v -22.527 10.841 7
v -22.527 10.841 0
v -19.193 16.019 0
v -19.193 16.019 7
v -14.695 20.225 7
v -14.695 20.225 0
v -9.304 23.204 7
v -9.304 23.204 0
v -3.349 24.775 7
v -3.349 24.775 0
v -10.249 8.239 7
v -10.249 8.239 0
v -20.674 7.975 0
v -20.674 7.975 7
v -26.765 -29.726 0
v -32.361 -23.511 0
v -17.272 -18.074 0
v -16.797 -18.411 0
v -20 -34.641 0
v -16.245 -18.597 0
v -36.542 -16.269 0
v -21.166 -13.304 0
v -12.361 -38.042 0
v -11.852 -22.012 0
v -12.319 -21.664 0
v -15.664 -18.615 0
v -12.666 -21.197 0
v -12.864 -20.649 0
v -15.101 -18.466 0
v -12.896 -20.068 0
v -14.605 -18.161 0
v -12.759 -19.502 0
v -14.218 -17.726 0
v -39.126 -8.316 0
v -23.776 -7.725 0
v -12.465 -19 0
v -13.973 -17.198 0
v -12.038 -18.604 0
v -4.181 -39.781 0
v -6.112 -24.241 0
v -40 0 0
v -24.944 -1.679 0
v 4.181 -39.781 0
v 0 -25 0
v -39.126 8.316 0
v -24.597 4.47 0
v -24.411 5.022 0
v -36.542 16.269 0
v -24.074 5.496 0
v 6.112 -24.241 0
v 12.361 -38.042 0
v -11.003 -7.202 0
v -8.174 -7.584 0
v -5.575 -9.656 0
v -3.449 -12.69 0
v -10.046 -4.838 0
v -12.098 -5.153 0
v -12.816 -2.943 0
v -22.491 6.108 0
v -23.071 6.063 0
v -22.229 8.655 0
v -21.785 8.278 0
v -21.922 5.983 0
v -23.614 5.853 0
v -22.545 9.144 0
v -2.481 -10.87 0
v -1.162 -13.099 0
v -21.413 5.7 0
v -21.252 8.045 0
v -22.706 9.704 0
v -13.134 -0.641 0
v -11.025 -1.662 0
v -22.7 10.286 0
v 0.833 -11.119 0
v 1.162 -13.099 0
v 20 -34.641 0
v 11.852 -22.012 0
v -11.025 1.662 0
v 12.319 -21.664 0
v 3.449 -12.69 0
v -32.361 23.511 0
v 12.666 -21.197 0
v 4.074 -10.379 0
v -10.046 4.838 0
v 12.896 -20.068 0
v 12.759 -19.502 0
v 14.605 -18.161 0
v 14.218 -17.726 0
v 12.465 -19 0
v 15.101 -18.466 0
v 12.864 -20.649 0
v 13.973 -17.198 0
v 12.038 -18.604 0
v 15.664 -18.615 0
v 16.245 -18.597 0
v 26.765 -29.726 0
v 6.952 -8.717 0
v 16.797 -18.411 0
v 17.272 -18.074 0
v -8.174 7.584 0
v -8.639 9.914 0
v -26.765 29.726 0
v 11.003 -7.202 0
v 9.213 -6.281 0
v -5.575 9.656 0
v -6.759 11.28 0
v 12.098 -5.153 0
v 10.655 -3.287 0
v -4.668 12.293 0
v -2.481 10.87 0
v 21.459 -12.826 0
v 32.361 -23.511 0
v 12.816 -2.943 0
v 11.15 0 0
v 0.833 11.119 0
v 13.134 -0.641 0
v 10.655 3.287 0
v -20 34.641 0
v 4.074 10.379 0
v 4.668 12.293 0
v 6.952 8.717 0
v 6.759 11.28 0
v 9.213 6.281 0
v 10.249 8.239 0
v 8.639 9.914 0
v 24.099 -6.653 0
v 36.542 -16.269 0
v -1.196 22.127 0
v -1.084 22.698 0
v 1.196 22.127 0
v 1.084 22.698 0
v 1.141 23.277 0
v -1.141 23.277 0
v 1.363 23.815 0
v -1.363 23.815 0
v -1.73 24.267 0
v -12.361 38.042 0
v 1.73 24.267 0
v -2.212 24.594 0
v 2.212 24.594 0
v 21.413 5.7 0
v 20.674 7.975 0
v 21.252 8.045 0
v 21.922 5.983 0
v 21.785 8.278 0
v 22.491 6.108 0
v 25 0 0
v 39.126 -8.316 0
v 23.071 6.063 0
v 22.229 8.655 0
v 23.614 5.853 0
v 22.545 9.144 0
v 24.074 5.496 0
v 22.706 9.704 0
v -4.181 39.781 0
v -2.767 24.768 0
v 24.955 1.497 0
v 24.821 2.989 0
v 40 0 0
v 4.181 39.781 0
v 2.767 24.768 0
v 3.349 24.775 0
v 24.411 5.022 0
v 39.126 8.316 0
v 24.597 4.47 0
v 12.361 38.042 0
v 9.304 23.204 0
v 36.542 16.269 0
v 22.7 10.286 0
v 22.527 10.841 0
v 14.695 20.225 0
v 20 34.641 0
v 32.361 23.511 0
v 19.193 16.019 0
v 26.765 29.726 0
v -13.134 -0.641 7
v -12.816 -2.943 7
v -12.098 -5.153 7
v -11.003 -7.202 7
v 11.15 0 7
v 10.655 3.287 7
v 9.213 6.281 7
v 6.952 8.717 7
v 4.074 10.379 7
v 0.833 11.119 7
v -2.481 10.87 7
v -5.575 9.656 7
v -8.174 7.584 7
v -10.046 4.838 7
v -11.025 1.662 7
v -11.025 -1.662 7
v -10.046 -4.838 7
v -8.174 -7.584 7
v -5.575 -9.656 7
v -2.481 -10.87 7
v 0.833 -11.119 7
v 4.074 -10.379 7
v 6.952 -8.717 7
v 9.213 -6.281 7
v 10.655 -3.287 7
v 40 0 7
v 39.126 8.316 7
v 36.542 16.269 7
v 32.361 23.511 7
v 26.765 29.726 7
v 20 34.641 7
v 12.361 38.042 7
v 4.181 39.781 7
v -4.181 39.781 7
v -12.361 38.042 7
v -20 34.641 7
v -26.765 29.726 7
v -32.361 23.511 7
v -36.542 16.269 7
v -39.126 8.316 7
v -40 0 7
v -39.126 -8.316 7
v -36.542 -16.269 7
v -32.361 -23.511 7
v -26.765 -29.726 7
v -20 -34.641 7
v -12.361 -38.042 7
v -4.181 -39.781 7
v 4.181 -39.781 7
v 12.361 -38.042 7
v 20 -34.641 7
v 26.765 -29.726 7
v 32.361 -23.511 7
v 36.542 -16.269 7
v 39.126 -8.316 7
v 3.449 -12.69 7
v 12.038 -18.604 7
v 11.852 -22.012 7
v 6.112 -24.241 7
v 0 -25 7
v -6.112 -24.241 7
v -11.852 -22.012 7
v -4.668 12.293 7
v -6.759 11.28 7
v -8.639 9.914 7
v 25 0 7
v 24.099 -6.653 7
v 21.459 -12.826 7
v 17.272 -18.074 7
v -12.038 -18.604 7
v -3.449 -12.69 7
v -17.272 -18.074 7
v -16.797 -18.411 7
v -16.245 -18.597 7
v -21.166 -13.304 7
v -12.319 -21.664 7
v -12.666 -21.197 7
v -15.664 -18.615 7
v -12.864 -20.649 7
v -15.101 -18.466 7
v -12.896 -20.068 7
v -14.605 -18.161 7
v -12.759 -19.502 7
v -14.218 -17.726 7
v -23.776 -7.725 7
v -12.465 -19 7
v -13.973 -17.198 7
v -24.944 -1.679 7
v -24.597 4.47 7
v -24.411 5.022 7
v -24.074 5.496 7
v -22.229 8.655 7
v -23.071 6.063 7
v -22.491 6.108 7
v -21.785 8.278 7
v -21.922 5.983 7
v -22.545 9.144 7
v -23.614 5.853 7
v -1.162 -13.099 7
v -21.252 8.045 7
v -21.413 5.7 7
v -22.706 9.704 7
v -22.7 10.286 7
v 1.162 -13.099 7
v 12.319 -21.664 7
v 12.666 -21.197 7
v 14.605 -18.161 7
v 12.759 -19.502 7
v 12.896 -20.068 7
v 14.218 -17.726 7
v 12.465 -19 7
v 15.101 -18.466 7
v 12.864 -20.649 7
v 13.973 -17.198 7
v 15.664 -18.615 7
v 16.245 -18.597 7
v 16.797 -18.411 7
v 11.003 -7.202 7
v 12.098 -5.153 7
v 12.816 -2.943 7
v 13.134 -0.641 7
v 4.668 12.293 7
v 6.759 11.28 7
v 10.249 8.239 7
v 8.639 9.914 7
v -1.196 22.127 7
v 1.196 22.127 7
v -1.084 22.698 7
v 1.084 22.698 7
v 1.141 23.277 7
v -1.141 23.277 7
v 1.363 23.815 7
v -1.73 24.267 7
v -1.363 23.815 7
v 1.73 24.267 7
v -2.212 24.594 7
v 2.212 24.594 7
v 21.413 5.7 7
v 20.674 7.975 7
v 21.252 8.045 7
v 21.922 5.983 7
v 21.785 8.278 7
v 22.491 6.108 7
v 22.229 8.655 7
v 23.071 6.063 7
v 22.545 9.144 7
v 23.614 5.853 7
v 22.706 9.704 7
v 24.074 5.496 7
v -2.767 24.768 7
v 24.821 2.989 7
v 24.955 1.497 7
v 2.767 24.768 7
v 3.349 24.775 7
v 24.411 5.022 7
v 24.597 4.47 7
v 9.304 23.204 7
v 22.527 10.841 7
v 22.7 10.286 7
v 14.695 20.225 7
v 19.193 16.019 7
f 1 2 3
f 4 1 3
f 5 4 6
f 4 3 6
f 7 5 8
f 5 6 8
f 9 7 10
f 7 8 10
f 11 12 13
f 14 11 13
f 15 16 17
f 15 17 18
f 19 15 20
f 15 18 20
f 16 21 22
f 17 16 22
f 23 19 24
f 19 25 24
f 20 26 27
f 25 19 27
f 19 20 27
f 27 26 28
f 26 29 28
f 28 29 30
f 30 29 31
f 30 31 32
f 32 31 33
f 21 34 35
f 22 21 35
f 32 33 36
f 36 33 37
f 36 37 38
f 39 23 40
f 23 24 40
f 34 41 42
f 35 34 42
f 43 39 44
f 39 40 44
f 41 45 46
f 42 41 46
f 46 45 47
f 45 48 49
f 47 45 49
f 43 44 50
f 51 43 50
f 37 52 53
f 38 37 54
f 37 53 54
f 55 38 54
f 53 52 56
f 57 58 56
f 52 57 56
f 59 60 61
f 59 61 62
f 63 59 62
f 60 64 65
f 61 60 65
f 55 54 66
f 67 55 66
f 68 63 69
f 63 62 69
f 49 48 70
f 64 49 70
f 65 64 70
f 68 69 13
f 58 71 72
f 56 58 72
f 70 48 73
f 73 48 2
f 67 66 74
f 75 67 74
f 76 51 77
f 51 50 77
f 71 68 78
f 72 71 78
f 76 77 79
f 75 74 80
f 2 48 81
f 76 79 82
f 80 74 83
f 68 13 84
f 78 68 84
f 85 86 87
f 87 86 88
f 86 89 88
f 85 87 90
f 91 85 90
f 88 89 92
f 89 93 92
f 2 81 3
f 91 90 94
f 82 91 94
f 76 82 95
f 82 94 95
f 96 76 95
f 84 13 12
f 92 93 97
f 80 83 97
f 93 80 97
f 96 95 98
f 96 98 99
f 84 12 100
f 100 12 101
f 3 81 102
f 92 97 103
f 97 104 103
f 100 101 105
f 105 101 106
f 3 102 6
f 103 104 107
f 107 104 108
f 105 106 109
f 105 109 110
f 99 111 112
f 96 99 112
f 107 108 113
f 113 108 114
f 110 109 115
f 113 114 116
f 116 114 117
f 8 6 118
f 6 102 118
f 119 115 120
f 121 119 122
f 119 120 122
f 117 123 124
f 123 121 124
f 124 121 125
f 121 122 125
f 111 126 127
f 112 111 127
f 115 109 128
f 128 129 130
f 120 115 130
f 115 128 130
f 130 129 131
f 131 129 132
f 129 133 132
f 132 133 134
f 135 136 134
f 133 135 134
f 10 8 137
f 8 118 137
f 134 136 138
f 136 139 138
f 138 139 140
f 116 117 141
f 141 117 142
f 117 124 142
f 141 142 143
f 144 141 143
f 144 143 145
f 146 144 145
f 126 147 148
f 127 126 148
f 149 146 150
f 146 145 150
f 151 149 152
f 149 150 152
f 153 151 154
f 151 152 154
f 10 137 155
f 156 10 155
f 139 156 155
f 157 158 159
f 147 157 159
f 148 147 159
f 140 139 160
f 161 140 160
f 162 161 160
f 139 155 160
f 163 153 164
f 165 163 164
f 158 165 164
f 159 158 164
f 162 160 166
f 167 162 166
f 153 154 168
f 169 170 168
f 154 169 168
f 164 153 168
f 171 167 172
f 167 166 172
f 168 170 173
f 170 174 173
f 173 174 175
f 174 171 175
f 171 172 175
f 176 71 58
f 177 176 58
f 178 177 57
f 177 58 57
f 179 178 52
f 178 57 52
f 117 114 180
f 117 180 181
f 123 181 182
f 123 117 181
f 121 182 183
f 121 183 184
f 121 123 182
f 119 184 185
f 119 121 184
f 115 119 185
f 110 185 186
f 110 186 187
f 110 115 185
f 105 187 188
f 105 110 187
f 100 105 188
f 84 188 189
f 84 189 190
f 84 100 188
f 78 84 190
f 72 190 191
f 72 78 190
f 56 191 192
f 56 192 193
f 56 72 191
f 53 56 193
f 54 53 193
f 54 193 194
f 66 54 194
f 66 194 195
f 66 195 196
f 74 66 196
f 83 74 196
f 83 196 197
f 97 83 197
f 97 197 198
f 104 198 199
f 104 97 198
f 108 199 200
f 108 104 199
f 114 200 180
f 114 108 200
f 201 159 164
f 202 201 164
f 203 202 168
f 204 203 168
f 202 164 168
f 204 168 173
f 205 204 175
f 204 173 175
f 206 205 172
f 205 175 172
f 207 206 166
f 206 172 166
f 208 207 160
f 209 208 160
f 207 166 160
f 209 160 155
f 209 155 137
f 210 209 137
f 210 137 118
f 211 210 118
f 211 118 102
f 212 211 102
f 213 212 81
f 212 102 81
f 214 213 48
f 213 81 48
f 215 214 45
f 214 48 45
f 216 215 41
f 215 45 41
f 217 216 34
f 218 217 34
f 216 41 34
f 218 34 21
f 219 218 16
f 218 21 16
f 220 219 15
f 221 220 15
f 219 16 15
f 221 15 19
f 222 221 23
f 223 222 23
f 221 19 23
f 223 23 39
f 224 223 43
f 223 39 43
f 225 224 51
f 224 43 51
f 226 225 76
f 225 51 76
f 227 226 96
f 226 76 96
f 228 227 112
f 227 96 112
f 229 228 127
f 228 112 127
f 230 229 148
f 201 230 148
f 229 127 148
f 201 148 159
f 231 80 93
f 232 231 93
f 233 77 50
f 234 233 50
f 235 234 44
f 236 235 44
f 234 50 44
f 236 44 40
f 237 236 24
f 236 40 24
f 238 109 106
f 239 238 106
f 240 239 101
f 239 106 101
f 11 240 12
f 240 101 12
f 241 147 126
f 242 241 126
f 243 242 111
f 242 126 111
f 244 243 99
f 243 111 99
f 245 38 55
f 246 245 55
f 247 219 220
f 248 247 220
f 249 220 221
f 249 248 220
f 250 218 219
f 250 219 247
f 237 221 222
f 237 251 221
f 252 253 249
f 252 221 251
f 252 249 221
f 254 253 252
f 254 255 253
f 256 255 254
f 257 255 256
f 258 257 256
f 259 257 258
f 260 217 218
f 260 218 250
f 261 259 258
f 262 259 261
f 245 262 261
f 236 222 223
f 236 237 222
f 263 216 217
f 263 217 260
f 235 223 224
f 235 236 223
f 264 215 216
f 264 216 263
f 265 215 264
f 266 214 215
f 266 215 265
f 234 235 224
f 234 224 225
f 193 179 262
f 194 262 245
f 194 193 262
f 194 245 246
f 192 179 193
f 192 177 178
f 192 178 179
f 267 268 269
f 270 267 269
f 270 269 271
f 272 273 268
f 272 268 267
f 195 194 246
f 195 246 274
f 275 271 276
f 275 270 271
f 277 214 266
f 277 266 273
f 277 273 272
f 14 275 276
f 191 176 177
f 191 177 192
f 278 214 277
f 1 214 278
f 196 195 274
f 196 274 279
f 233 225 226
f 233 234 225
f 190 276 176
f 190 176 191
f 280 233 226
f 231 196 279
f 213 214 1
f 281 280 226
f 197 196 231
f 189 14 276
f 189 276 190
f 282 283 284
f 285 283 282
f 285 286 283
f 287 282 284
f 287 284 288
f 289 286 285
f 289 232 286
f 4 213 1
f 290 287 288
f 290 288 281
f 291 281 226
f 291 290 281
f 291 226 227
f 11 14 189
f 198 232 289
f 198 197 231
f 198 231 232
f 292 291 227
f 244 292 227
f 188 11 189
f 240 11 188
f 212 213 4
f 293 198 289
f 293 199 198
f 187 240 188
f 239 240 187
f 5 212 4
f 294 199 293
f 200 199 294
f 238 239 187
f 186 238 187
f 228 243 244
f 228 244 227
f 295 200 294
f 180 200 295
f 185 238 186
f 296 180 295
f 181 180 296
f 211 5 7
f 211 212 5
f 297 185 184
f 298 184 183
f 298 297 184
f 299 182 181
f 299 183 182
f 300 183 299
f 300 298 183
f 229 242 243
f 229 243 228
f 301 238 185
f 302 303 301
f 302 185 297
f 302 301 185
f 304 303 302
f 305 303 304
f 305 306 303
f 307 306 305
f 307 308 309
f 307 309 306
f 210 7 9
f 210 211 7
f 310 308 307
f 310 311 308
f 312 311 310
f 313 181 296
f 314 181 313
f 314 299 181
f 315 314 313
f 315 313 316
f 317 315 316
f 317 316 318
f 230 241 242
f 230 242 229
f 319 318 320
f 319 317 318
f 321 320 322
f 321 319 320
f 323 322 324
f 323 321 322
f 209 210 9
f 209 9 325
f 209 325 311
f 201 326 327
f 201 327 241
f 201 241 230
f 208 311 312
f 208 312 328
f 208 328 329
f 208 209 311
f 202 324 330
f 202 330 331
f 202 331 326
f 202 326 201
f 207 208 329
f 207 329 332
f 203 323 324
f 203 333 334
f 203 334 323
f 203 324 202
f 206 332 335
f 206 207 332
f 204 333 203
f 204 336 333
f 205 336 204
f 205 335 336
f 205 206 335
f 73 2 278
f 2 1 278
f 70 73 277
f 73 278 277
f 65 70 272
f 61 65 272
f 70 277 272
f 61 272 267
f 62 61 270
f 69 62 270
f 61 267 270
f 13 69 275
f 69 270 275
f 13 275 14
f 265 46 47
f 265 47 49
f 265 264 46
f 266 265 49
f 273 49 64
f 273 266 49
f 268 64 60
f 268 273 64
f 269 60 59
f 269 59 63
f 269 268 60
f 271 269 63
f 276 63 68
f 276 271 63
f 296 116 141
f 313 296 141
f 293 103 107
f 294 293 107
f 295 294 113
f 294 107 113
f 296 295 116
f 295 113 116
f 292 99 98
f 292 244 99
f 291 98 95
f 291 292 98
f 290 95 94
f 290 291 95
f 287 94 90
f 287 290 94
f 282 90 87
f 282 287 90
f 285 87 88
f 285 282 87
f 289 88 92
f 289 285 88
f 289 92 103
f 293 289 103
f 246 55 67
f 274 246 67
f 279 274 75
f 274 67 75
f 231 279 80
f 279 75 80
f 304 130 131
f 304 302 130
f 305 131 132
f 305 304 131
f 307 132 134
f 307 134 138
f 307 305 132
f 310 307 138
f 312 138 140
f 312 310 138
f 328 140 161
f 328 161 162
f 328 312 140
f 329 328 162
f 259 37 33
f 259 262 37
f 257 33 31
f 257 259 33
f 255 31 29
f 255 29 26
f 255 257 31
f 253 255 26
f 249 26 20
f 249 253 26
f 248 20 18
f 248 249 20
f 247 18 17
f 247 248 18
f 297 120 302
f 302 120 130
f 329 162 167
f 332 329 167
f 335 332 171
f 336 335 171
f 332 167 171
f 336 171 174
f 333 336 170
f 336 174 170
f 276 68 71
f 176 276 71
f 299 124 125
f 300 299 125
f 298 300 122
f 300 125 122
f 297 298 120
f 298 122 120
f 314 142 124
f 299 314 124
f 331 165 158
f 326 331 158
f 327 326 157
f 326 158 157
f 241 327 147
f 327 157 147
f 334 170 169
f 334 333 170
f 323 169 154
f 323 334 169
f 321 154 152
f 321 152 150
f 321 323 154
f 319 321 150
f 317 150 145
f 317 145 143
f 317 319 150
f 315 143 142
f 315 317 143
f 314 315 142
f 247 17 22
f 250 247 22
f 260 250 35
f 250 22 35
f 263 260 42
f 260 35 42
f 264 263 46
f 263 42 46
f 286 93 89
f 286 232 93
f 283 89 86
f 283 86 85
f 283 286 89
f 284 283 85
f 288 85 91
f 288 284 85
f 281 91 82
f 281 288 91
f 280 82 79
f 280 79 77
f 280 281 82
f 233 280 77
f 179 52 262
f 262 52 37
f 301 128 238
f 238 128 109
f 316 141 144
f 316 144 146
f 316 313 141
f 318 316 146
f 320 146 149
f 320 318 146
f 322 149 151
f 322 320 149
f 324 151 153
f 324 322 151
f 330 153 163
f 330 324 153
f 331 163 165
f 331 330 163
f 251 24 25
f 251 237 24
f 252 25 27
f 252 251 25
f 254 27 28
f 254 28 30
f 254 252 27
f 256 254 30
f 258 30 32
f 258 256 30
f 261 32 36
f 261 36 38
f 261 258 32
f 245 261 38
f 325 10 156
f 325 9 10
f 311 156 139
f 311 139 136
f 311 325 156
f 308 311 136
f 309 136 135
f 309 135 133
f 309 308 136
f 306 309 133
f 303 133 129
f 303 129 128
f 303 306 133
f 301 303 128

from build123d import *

# Parameters (mm, degrees)
F0_R     = 40
F0_R_2   = 35
F0_R_3   = 30
F0_R_4   = 11.15
F1_DEPTH = 7
F2_R     = 2


with BuildPart() as f1:
    # F0 (on Top) → F1 (new body)
    with BuildSketch(Plane.XY):
        Circle(F0_R)
        Circle(F0_R_2, mode=Mode.SUBTRACT)
        Circle(F0_R_2)
        Circle(F0_R_3, mode=Mode.SUBTRACT)
        Circle(F0_R_3)
        with BuildLine():
            ThreePointArc((0.1811274542, 24.9993438483), (14.6946313073, 20.2254248594), (23.7198174085, 7.8974845429))
            Line((23.7198174085, 7.8974845429), (24.2635492258, 7.883705044))
            Line((24.2635492258, 7.883705044), (23.8317603315, 7.5529596518))
            ThreePointArc((23.8317603315, 7.5529596518), (24.7062138772, 3.8213866405), (25, 0))
            ThreePointArc((25, 0), (22.3161322869, -11.2689946204), (14.8407808196, -20.1184299752))
            Line((14.8407808196, -20.1184299752), (14.9956981092, -20.6398077624))
            Line((14.9956981092, -20.6398077624), (14.5477104425, -20.3313580678))
            ThreePointArc((14.5477104425, -20.3313580678), (0, -25), (-14.5477104425, -20.3313580678))
            Line((-14.5477104425, -20.3313580678), (-14.9956981092, -20.6398077624))
            Line((-14.9956981092, -20.6398077624), (-14.8407808196, -20.1184299752))
            ThreePointArc((-14.8407808196, -20.1184299752), (-23.7764129074, -7.7254248594), (-23.8317603315, 7.5529596518))
            Line((-23.8317603315, 7.5529596518), (-24.2635492258, 7.883705044))
            Line((-24.2635492258, 7.883705044), (-23.7198174085, 7.8974845429))
            ThreePointArc((-23.7198174085, 7.8974845429), (-14.6946313073, 20.2254248594), (-0.1811274542, 24.9993438483))
            Line((-0.1811274542, 24.9993438483), (0, 25.5122054368))
            Line((0, 25.5122054368), (0.1811274542, 24.9993438483))
        make_face(mode=Mode.SUBTRACT)
        with BuildLine():
            Line((13.1343616929, -0.6411262894), (10.2490772421, 8.2388661651))
            ThreePointArc((10.2490772421, 8.2388661651), (7.7293760676, 10.638573476), (4.6684883087, 12.2934013565))
            Line((4.6684883087, 12.2934013565), (-4.6684883087, 12.2934013565))
            ThreePointArc((-4.6684883087, 12.2934013565), (-7.7293760676, 10.638573476), (-10.2490772421, 8.2388661651))
            Line((-10.2490772421, 8.2388661651), (-13.1343616929, -0.6411262894))
            ThreePointArc((-13.1343616929, -0.6411262894), (-12.5063931893, -4.063573476), (-11.0027663976, -7.2015020377))
            Line((-11.0027663976, -7.2015020377), (-3.4489936381, -12.6896391944))
            ThreePointArc((-3.4489936381, -12.6896391944), (0, -13.15), (3.4489936381, -12.6896391944))
            Line((3.4489936381, -12.6896391944), (11.0027663976, -7.2015020377))
            ThreePointArc((11.0027663976, -7.2015020377), (12.5063931893, -4.063573476), (13.1343616929, -0.6411262894))
        make_face()
        Circle(F0_R_4, mode=Mode.SUBTRACT)
        with BuildLine():
            ThreePointArc((-4.6684883087, 12.2934013565), (0, 13.15), (4.6684883087, 12.2934013565))
            Line((4.6684883087, 12.2934013565), (0.1811274542, 24.9993438483))
            ThreePointArc((0.1811274542, 24.9993438483), (0, 25), (-0.1811274542, 24.9993438483))
            Line((-0.1811274542, 24.9993438483), (-4.6684883087, 12.2934013565))
        make_face()
        with BuildLine():
            ThreePointArc((-13.1343616929, -0.6411262894), (-12.5063931893, 4.063573476), (-10.2490772421, 8.2388661651))
            Line((-10.2490772421, 8.2388661651), (-23.7198174085, 7.8974845429))
            ThreePointArc((-23.7198174085, 7.8974845429), (-23.7764129074, 7.7254248594), (-23.8317603315, 7.5529596518))
            Line((-23.8317603315, 7.5529596518), (-13.1343616929, -0.6411262894))
        make_face()
        with BuildLine():
            Line((-14.5477104425, -20.3313580678), (-3.4489936381, -12.6896391944))
            ThreePointArc((-3.4489936381, -12.6896391944), (-7.7293760676, -10.638573476), (-11.0027663976, -7.2015020377))
            Line((-11.0027663976, -7.2015020377), (-14.8407808196, -20.1184299752))
            ThreePointArc((-14.8407808196, -20.1184299752), (-14.6946313073, -20.2254248594), (-14.5477104425, -20.3313580678))
        make_face()
        with BuildLine():
            Line((14.8407808196, -20.1184299752), (11.0027663976, -7.2015020377))
            ThreePointArc((11.0027663976, -7.2015020377), (7.7293760676, -10.638573476), (3.4489936381, -12.6896391944))
            Line((3.4489936381, -12.6896391944), (14.5477104425, -20.3313580678))
            ThreePointArc((14.5477104425, -20.3313580678), (14.6946313073, -20.2254248594), (14.8407808196, -20.1184299752))
        make_face()
        with BuildLine():
            ThreePointArc((10.2490772421, 8.2388661651), (12.4035854843, 4.3673295197), (13.15, 0))
            ThreePointArc((13.15, 0), (13.1460898419, -0.3206584927), (13.1343616929, -0.6411262894))
            Line((13.1343616929, -0.6411262894), (23.8317603315, 7.5529596518))
            ThreePointArc((23.8317603315, 7.5529596518), (23.7764129074, 7.7254248594), (23.7198174085, 7.8974845429))
            Line((23.7198174085, 7.8974845429), (10.2490772421, 8.2388661651))
        make_face()
        with BuildLine():
            Line((-4.6684883087, 12.2934013565), (4.6684883087, 12.2934013565))
            ThreePointArc((4.6684883087, 12.2934013565), (0, 13.15), (-4.6684883087, 12.2934013565))
        make_face()
        with BuildLine():
            ThreePointArc((13.1343616929, -0.6411262894), (13.1460898419, -0.3206584927), (13.15, 0))
            ThreePointArc((13.15, 0), (12.4035854843, 4.3673295197), (10.2490772421, 8.2388661651))
            Line((10.2490772421, 8.2388661651), (13.1343616929, -0.6411262894))
        make_face()
        with BuildLine():
            ThreePointArc((3.4489936381, -12.6896391944), (7.7293760676, -10.638573476), (11.0027663976, -7.2015020377))
            Line((11.0027663976, -7.2015020377), (3.4489936381, -12.6896391944))
        make_face()
        with BuildLine():
            ThreePointArc((-11.0027663976, -7.2015020377), (-7.7293760676, -10.638573476), (-3.4489936381, -12.6896391944))
            Line((-3.4489936381, -12.6896391944), (-11.0027663976, -7.2015020377))
        make_face()
        with BuildLine():
            Line((-13.1343616929, -0.6411262894), (-10.2490772421, 8.2388661651))
            ThreePointArc((-10.2490772421, 8.2388661651), (-12.5063931893, 4.063573476), (-13.1343616929, -0.6411262894))
        make_face()
        with BuildLine():
            ThreePointArc((-23.8317603315, 7.5529596518), (-23.7764129074, 7.7254248594), (-23.7198174085, 7.8974845429))
            Line((-23.7198174085, 7.8974845429), (-24.2635492258, 7.883705044))
            Line((-24.2635492258, 7.883705044), (-23.8317603315, 7.5529596518))
        make_face()
        with BuildLine():
            Line((-14.9956981092, -20.6398077624), (-14.5477104425, -20.3313580678))
            ThreePointArc((-14.5477104425, -20.3313580678), (-14.6946313073, -20.2254248594), (-14.8407808196, -20.1184299752))
            Line((-14.8407808196, -20.1184299752), (-14.9956981092, -20.6398077624))
        make_face()
        with BuildLine():
            Line((14.9956981092, -20.6398077624), (14.8407808196, -20.1184299752))
            ThreePointArc((14.8407808196, -20.1184299752), (14.6946313073, -20.2254248594), (14.5477104425, -20.3313580678))
            Line((14.5477104425, -20.3313580678), (14.9956981092, -20.6398077624))
        make_face()
        with BuildLine():
            Line((24.2635492258, 7.883705044), (23.7198174085, 7.8974845429))
            ThreePointArc((23.7198174085, 7.8974845429), (23.7764129074, 7.7254248594), (23.8317603315, 7.5529596518))
            Line((23.8317603315, 7.5529596518), (24.2635492258, 7.883705044))
        make_face()
        with BuildLine():
            ThreePointArc((-0.1811274542, 24.9993438483), (0, 25), (0.1811274542, 24.9993438483))
            Line((0.1811274542, 24.9993438483), (0, 25.5122054368))
            Line((0, 25.5122054368), (-0.1811274542, 24.9993438483))
        make_face()
    extrude(amount=F1_DEPTH)

    # F2
    f2_edges = [f1.edges().sort_by_distance(p)[0] for p in [
        (0.181127, 24.999344, 3.5),
        (-0.181127, 24.999344, 3.5),
        (23.719817, 7.897485, 3.5),
        (23.83176, 7.55296, 3.5),
        (14.840781, -20.11843, 3.5),
        (14.54771, -20.331358, 3.5),
        (-14.54771, -20.331358, 3.5),
        (-14.840781, -20.11843, 3.5),
        (-23.83176, 7.55296, 3.5),
        (-23.719817, 7.897485, 3.5),
    ]]
    fillet(f2_edges, radius=F2_R)


solid = f1.part
